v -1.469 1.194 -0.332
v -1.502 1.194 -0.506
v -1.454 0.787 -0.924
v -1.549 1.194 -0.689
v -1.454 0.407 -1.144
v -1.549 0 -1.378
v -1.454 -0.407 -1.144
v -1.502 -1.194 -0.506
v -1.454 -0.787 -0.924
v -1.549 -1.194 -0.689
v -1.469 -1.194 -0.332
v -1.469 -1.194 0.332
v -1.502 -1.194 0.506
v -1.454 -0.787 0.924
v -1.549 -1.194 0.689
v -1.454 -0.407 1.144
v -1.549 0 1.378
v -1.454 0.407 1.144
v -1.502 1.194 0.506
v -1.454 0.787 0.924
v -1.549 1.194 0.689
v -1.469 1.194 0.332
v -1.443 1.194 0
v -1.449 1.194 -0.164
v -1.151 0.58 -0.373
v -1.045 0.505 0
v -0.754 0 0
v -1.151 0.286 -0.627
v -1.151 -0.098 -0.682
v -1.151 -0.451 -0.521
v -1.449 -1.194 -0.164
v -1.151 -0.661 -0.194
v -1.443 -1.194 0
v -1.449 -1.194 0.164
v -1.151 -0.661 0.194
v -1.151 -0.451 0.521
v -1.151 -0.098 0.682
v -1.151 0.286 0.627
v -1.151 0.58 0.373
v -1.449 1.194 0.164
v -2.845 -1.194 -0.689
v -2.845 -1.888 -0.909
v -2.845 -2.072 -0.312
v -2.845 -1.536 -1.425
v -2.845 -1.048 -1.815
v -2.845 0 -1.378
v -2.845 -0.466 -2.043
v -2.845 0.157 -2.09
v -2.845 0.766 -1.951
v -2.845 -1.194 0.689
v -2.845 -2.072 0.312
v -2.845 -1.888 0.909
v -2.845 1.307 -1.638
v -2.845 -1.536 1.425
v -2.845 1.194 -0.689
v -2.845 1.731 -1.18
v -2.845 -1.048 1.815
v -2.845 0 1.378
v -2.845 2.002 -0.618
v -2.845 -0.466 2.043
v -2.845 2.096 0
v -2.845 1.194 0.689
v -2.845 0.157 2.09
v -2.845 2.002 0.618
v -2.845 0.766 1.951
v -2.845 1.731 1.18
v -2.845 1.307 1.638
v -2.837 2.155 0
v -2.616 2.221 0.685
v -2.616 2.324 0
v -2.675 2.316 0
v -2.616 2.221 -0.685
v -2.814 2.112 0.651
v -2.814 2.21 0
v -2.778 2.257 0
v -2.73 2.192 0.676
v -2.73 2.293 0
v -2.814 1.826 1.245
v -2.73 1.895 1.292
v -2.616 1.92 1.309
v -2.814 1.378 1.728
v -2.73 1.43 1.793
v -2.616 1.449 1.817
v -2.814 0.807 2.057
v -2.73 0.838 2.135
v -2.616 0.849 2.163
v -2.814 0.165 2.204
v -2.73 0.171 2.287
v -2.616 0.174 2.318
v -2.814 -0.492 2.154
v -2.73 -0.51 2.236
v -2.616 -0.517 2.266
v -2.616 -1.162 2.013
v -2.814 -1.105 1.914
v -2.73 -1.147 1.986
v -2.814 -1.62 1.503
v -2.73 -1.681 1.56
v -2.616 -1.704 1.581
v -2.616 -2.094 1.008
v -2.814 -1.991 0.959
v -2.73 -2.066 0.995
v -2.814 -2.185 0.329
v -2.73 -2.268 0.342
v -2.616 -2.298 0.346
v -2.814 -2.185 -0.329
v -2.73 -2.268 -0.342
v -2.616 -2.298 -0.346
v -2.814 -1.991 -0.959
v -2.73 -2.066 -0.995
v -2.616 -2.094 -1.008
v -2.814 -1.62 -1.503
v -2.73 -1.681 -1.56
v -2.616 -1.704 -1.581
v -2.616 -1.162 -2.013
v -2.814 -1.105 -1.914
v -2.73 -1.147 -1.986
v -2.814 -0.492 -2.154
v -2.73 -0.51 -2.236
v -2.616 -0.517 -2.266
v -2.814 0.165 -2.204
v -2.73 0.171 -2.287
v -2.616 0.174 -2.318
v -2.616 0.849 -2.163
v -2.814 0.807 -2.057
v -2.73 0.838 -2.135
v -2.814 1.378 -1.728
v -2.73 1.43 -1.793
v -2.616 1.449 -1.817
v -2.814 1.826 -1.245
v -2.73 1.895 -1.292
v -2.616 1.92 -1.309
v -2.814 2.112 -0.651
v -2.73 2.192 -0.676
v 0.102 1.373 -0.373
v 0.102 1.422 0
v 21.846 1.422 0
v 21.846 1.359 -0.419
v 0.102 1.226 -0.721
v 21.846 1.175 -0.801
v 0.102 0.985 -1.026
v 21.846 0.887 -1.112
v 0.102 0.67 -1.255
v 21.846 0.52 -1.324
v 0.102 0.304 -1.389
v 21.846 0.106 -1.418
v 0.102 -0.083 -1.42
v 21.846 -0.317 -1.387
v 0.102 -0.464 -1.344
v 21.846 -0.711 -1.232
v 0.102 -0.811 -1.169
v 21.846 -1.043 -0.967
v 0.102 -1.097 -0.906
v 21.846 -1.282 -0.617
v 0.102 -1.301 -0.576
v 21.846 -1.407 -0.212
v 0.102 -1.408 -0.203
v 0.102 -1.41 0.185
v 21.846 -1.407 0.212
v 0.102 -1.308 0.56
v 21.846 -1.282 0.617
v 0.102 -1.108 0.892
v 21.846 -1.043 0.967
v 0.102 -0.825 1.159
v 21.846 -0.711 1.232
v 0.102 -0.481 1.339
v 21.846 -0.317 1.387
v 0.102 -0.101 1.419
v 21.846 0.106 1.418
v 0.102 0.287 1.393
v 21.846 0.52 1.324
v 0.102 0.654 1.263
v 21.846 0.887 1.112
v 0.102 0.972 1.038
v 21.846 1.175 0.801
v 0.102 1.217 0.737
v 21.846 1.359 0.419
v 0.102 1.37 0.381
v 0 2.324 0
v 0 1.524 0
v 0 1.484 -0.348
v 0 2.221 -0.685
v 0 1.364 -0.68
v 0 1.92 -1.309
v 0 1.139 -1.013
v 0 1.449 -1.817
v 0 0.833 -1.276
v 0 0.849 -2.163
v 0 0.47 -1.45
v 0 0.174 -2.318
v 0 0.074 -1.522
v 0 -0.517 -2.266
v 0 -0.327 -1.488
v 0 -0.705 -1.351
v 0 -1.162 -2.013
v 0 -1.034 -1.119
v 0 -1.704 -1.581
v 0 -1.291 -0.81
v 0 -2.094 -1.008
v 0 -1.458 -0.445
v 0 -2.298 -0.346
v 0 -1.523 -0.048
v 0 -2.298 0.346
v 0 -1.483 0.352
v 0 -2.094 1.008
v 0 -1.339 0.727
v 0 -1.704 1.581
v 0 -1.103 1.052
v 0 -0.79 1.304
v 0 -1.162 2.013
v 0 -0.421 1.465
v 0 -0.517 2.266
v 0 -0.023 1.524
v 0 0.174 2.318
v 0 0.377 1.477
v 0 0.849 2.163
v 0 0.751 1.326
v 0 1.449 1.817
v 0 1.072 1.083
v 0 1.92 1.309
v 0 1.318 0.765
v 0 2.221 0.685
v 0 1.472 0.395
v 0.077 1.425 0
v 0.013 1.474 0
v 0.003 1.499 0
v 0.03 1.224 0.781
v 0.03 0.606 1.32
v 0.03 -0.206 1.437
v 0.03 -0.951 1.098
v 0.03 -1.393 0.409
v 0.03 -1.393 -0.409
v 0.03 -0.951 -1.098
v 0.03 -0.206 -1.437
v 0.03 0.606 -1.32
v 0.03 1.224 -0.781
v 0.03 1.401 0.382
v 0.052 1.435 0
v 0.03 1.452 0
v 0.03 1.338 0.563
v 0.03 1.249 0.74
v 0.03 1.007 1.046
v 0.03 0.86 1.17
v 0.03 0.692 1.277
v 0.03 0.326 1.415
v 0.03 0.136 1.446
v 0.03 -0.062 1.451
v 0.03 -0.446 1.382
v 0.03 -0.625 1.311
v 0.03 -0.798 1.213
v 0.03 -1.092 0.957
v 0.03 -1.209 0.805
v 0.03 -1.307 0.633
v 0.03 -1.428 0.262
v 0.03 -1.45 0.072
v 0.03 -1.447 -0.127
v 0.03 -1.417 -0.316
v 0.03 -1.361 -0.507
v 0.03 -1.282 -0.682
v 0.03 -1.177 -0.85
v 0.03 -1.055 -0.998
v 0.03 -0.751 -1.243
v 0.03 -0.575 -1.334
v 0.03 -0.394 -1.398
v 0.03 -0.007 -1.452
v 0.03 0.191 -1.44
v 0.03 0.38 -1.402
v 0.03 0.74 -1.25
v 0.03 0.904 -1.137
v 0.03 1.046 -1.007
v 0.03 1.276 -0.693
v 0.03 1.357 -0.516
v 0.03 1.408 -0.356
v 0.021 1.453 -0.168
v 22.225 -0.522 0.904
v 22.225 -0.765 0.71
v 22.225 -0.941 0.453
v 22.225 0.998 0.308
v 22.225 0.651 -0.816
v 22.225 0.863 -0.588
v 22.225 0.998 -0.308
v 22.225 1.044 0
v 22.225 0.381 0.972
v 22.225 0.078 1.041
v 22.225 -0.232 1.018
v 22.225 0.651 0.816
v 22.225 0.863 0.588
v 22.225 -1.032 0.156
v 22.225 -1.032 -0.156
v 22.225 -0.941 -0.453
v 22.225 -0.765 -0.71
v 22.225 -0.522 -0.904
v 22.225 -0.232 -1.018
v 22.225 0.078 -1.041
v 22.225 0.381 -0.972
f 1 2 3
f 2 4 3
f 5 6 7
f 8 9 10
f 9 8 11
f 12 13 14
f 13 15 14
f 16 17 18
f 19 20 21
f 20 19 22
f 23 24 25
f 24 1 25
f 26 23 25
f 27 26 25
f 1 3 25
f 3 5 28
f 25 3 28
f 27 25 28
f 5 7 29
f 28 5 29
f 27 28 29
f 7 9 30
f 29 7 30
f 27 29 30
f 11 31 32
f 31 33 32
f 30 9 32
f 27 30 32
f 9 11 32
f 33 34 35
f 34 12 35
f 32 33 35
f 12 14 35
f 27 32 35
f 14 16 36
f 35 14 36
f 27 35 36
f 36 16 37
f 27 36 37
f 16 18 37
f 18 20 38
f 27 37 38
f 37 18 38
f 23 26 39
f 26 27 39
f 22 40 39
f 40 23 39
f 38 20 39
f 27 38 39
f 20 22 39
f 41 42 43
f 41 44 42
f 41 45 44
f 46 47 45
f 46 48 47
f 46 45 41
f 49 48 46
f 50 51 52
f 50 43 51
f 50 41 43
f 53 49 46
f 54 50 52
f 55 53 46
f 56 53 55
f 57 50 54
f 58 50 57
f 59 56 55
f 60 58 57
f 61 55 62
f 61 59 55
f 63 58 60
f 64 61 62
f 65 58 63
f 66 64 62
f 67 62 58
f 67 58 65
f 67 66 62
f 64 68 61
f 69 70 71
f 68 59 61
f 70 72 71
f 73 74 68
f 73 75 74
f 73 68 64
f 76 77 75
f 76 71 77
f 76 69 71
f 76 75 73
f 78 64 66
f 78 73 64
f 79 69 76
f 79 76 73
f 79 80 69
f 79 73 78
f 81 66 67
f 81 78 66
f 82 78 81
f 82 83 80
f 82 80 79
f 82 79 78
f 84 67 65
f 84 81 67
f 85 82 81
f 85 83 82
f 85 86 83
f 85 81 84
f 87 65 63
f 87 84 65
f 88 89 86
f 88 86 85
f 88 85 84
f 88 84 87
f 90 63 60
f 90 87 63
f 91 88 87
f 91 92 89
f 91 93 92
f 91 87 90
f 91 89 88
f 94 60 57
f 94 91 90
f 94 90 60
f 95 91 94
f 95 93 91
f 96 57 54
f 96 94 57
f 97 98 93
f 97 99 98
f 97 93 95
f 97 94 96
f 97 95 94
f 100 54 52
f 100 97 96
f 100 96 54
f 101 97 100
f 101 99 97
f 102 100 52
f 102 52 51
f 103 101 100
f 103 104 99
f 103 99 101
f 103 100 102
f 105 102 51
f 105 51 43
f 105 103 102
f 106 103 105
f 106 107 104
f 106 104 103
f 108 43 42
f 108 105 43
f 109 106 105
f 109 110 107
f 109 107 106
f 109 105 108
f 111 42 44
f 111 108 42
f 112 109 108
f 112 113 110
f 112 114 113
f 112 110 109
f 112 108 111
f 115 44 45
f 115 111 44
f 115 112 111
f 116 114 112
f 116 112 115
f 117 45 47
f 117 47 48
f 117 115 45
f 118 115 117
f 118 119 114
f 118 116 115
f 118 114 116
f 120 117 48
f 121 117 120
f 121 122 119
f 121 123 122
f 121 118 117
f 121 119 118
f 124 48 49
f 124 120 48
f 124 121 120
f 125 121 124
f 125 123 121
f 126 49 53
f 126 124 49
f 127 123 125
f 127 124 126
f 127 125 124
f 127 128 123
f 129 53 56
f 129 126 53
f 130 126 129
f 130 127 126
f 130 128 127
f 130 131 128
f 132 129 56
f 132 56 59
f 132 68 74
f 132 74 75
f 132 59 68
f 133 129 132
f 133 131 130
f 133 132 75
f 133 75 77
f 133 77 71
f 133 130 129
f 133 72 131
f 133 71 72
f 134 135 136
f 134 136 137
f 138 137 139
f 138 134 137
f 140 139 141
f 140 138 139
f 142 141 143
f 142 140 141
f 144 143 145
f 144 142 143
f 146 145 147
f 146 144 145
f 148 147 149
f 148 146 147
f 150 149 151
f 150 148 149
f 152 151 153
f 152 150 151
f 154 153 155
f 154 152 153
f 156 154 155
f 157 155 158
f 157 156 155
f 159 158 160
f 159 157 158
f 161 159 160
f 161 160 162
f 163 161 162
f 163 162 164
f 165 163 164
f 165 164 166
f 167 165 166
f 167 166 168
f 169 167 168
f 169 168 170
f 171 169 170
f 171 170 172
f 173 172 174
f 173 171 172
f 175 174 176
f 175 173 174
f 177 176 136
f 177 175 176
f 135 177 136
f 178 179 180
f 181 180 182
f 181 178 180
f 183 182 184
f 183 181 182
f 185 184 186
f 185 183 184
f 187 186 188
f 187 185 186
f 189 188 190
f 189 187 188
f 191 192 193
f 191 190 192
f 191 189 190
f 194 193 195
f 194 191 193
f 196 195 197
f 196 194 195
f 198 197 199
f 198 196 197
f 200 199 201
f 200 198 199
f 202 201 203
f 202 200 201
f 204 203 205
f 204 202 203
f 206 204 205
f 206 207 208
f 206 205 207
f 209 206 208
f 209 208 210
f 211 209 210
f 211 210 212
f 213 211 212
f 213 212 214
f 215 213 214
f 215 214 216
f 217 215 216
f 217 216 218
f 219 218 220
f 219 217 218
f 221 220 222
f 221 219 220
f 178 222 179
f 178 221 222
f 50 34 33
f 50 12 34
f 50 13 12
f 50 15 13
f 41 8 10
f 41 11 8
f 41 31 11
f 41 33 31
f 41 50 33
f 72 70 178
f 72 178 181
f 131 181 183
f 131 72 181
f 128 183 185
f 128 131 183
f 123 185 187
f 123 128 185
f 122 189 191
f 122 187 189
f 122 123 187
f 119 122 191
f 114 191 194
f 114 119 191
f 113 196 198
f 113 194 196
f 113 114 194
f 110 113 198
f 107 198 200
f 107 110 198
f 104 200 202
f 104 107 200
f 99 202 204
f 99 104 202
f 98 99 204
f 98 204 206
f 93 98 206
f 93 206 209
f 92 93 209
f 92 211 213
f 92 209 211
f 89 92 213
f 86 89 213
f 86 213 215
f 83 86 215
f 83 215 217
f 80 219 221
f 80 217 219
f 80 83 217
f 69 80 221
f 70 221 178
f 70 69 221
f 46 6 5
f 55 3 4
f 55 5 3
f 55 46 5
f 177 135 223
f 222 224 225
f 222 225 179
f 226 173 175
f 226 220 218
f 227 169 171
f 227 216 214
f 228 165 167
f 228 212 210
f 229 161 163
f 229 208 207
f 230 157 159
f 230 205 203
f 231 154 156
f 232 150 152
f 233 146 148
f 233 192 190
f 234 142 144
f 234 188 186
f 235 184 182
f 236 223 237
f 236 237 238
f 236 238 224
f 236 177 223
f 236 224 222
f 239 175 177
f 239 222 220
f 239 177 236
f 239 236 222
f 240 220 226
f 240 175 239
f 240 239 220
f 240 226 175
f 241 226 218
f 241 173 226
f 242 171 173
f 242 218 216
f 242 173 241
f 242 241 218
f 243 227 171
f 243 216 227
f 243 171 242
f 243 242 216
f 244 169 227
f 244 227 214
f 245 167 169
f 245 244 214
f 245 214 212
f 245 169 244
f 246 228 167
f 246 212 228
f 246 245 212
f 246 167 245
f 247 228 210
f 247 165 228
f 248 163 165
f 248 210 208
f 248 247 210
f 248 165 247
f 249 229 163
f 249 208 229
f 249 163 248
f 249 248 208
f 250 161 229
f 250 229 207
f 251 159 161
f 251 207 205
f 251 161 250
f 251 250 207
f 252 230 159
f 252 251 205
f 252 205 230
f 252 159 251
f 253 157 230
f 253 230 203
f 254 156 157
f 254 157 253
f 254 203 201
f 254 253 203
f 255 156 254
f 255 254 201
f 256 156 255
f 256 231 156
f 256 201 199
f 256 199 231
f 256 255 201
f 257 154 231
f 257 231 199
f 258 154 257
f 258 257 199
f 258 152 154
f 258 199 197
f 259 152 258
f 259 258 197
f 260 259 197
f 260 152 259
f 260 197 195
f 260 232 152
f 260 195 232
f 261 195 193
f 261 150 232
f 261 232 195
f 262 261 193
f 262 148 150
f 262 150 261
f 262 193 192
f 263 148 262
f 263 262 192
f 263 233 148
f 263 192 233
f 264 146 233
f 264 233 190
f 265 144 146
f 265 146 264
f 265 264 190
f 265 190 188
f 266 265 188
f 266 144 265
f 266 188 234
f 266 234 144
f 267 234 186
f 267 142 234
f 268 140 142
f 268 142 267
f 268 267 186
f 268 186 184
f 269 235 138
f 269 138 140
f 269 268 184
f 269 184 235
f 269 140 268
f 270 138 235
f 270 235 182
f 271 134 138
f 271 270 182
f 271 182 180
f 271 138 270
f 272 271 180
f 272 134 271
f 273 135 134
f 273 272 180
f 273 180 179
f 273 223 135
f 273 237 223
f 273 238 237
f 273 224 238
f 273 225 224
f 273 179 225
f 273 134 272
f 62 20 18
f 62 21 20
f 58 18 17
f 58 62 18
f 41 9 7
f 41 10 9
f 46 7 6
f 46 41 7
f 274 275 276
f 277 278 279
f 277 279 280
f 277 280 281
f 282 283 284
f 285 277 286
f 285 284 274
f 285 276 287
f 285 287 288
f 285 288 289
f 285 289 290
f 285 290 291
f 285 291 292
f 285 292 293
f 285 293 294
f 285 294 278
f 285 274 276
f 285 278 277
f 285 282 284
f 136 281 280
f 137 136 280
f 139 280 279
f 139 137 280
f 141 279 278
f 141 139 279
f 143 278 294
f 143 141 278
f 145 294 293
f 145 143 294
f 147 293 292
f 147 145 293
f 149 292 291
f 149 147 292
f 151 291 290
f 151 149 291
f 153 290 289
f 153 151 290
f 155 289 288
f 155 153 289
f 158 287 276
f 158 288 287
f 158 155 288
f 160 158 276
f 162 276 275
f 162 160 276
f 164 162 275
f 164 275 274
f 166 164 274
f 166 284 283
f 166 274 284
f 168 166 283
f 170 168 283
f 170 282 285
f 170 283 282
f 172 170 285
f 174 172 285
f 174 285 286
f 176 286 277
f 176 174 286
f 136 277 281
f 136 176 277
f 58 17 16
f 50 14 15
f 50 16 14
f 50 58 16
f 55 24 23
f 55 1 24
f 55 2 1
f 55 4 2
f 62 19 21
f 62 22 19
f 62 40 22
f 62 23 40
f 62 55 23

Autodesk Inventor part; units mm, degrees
ref_plane "YZ Plane" through (0, 0, 0) normal (1, 0, 0) x (0, 1, 0)
ref_plane "XZ Plane" through (0, 0, 0) normal (0, 1, 0) x (-1, 0, 0)
sketch "Sketch1" plane through (0, 0, 0) normal (0, 0, 1) x (1, 0, 0)
  line L0 (-0.7535, 0) -> (22.225, 0)
  line L1 (22.225, 0) -> (22.225, 1.4224)
  line L2 (22.225, 1.4224) -> (1.5877, 1.4224)
  line L3 (1.5877, 1.4224) -> (0.0001, 1.4224)
  line L4 (0.0001, 1.4224) -> (0, 1.4224)
  line L5 (0, 1.4224) -> (0, 2.3241)
  line L6 (0, 2.3241) -> (-2.8448, 2.3241)
  line L7 (-2.8448, 2.3241) -> (-2.8448, 1.3785)
  line L8 (-2.8448, 1.3785) -> (-1.5494, 1.3785)
  line L9 (-1.5494, 1.3785) -> (-0.7535, 0)
  line L10 (-7.8588, 0) -> (27.239, 0) projected
  line L11 (0, -0.4648) -> (0, 2.7889) projected
  line L12 (1.5877, 1.4224) -> (0, 1.4224) construction
  dimension "d1" = 20.6373
  dimension "d2" = 1.5876
  dimension "d3" = 2.8448
  dimension "d4" = 1.2954
  dimension "d5" = 60
  dimension "d6" = 2.8448
  dimension "d7" = 2.8448
  dimension "d8" = 2.757
  dimension "d9" = 4.6482
  dimension "d26" = 22.225
revolve "Body" add sketch "Sketch1" angle 360 about axis through (-0.7535, 0, 0) along (1, 0, 0)
sketch "Sketch2" plane through (-2.8448, 0, 0) normal (-1, 0, 0) x (0, 0, 1)
  circle A0 centre (0, 0) radius 1.3785 projected
  line L0 (0, -3.2537) -> (0, 3.2537) projected
  line L1 (-3.2537, 0) -> (3.2537, 0) projected
  line L2 (1.3785, 0) -> (0.6892, -1.1938)
  line L3 (0.6892, -1.1938) -> (-0.6892, -1.1938)
  line L4 (-0.6892, -1.1938) -> (-1.3785, 0)
  line L5 (-1.3785, 0) -> (-0.6892, 1.1938)
  line L6 (-0.6892, 1.1938) -> (0.6892, 1.1938)
  line L7 (0.6892, 1.1938) -> (1.3785, 0)
extrude "Slot" add sketch "Sketch2" against normal up to next contours L7 A0 | A0 L2 | L6 L0 A0 | A0 L0 L3 | L0 L6 A0 | A0 L3 L0 | L4 A0 | A0 L5
fillet "Fillet1" radius 0.2286 1 edges at (-2.8448, -2.3241, 0)
thread "Thread" size "4-40 UNC" class "2A" standard "ANSI Unified Screw Threads" length 20.6373
chamfer "Chamfer1" distance 0.3785 distance2 0.3785 1 edges at (22.225, -1.4224, 0) measured on face at (22.225, -0.0669, -0.3902)
ref_plane "Work Plane1" through (29, 0, 0) normal (0, -1, 0) x (1, 0, 0)
fillet "Fillet2" radius 0.1016 1 edges at (0.0001, -1.4224, 0)
equation "\"d1\" = GEL"
equation "\"d3\" = KOH"
equation "\"d4\" = INTI"
equation "\"d6\" = GD"
equation "\"d7\" = BDM"
equation "\"d8\" = 1.1547 * SW"
equation "\"d9\" = KOD"
equation "\"d26\" = NLG"
equation "\"d30\" = R"
equation "\"d17\" = RR"
equation "\"d13\" = GEL"
equation "\"d15\" = -0.5 * SPD + 0.5 * GD"
equation "\"d16\" = GUL"
equation "\"GD\" = 2.8448"
equation "\"NLG\" = 22.225"
equation "\"GEL\" = 20.6373"
equation "\"KOD\" = 4.6482"
equation "\"KOH\" = 2.8448"
equation "\"INTI\" = 1.2954"
equation "\"GAL\" = 1.5875"
equation "\"GUL\" = 0.37846"
equation "\"BDM\" = 2.8448"
equation "\"SW\" = 2.3876"
equation "\"RR\" = 0.2286"
equation "\"SPD\" = 2.08788"
equation "\"R\" = 0.1016"
equation "\"PHH\" = 0.127"
equation "\"GD1\" = SPD"
equation "\"THREADDIA\" = 2.8448"
equation "\"FAWI\" = 45deg"
equation "\"KOH1\" = 2.5654"
equation "\"NND\" = 2.8448"
equation "\"TOA\" = 30deg"
equation "\"E0\" = 1.155 * SW"
properties part number "ANSI B18.3 - No. 4 - 40 UNC - 7/8 HS HCS"
